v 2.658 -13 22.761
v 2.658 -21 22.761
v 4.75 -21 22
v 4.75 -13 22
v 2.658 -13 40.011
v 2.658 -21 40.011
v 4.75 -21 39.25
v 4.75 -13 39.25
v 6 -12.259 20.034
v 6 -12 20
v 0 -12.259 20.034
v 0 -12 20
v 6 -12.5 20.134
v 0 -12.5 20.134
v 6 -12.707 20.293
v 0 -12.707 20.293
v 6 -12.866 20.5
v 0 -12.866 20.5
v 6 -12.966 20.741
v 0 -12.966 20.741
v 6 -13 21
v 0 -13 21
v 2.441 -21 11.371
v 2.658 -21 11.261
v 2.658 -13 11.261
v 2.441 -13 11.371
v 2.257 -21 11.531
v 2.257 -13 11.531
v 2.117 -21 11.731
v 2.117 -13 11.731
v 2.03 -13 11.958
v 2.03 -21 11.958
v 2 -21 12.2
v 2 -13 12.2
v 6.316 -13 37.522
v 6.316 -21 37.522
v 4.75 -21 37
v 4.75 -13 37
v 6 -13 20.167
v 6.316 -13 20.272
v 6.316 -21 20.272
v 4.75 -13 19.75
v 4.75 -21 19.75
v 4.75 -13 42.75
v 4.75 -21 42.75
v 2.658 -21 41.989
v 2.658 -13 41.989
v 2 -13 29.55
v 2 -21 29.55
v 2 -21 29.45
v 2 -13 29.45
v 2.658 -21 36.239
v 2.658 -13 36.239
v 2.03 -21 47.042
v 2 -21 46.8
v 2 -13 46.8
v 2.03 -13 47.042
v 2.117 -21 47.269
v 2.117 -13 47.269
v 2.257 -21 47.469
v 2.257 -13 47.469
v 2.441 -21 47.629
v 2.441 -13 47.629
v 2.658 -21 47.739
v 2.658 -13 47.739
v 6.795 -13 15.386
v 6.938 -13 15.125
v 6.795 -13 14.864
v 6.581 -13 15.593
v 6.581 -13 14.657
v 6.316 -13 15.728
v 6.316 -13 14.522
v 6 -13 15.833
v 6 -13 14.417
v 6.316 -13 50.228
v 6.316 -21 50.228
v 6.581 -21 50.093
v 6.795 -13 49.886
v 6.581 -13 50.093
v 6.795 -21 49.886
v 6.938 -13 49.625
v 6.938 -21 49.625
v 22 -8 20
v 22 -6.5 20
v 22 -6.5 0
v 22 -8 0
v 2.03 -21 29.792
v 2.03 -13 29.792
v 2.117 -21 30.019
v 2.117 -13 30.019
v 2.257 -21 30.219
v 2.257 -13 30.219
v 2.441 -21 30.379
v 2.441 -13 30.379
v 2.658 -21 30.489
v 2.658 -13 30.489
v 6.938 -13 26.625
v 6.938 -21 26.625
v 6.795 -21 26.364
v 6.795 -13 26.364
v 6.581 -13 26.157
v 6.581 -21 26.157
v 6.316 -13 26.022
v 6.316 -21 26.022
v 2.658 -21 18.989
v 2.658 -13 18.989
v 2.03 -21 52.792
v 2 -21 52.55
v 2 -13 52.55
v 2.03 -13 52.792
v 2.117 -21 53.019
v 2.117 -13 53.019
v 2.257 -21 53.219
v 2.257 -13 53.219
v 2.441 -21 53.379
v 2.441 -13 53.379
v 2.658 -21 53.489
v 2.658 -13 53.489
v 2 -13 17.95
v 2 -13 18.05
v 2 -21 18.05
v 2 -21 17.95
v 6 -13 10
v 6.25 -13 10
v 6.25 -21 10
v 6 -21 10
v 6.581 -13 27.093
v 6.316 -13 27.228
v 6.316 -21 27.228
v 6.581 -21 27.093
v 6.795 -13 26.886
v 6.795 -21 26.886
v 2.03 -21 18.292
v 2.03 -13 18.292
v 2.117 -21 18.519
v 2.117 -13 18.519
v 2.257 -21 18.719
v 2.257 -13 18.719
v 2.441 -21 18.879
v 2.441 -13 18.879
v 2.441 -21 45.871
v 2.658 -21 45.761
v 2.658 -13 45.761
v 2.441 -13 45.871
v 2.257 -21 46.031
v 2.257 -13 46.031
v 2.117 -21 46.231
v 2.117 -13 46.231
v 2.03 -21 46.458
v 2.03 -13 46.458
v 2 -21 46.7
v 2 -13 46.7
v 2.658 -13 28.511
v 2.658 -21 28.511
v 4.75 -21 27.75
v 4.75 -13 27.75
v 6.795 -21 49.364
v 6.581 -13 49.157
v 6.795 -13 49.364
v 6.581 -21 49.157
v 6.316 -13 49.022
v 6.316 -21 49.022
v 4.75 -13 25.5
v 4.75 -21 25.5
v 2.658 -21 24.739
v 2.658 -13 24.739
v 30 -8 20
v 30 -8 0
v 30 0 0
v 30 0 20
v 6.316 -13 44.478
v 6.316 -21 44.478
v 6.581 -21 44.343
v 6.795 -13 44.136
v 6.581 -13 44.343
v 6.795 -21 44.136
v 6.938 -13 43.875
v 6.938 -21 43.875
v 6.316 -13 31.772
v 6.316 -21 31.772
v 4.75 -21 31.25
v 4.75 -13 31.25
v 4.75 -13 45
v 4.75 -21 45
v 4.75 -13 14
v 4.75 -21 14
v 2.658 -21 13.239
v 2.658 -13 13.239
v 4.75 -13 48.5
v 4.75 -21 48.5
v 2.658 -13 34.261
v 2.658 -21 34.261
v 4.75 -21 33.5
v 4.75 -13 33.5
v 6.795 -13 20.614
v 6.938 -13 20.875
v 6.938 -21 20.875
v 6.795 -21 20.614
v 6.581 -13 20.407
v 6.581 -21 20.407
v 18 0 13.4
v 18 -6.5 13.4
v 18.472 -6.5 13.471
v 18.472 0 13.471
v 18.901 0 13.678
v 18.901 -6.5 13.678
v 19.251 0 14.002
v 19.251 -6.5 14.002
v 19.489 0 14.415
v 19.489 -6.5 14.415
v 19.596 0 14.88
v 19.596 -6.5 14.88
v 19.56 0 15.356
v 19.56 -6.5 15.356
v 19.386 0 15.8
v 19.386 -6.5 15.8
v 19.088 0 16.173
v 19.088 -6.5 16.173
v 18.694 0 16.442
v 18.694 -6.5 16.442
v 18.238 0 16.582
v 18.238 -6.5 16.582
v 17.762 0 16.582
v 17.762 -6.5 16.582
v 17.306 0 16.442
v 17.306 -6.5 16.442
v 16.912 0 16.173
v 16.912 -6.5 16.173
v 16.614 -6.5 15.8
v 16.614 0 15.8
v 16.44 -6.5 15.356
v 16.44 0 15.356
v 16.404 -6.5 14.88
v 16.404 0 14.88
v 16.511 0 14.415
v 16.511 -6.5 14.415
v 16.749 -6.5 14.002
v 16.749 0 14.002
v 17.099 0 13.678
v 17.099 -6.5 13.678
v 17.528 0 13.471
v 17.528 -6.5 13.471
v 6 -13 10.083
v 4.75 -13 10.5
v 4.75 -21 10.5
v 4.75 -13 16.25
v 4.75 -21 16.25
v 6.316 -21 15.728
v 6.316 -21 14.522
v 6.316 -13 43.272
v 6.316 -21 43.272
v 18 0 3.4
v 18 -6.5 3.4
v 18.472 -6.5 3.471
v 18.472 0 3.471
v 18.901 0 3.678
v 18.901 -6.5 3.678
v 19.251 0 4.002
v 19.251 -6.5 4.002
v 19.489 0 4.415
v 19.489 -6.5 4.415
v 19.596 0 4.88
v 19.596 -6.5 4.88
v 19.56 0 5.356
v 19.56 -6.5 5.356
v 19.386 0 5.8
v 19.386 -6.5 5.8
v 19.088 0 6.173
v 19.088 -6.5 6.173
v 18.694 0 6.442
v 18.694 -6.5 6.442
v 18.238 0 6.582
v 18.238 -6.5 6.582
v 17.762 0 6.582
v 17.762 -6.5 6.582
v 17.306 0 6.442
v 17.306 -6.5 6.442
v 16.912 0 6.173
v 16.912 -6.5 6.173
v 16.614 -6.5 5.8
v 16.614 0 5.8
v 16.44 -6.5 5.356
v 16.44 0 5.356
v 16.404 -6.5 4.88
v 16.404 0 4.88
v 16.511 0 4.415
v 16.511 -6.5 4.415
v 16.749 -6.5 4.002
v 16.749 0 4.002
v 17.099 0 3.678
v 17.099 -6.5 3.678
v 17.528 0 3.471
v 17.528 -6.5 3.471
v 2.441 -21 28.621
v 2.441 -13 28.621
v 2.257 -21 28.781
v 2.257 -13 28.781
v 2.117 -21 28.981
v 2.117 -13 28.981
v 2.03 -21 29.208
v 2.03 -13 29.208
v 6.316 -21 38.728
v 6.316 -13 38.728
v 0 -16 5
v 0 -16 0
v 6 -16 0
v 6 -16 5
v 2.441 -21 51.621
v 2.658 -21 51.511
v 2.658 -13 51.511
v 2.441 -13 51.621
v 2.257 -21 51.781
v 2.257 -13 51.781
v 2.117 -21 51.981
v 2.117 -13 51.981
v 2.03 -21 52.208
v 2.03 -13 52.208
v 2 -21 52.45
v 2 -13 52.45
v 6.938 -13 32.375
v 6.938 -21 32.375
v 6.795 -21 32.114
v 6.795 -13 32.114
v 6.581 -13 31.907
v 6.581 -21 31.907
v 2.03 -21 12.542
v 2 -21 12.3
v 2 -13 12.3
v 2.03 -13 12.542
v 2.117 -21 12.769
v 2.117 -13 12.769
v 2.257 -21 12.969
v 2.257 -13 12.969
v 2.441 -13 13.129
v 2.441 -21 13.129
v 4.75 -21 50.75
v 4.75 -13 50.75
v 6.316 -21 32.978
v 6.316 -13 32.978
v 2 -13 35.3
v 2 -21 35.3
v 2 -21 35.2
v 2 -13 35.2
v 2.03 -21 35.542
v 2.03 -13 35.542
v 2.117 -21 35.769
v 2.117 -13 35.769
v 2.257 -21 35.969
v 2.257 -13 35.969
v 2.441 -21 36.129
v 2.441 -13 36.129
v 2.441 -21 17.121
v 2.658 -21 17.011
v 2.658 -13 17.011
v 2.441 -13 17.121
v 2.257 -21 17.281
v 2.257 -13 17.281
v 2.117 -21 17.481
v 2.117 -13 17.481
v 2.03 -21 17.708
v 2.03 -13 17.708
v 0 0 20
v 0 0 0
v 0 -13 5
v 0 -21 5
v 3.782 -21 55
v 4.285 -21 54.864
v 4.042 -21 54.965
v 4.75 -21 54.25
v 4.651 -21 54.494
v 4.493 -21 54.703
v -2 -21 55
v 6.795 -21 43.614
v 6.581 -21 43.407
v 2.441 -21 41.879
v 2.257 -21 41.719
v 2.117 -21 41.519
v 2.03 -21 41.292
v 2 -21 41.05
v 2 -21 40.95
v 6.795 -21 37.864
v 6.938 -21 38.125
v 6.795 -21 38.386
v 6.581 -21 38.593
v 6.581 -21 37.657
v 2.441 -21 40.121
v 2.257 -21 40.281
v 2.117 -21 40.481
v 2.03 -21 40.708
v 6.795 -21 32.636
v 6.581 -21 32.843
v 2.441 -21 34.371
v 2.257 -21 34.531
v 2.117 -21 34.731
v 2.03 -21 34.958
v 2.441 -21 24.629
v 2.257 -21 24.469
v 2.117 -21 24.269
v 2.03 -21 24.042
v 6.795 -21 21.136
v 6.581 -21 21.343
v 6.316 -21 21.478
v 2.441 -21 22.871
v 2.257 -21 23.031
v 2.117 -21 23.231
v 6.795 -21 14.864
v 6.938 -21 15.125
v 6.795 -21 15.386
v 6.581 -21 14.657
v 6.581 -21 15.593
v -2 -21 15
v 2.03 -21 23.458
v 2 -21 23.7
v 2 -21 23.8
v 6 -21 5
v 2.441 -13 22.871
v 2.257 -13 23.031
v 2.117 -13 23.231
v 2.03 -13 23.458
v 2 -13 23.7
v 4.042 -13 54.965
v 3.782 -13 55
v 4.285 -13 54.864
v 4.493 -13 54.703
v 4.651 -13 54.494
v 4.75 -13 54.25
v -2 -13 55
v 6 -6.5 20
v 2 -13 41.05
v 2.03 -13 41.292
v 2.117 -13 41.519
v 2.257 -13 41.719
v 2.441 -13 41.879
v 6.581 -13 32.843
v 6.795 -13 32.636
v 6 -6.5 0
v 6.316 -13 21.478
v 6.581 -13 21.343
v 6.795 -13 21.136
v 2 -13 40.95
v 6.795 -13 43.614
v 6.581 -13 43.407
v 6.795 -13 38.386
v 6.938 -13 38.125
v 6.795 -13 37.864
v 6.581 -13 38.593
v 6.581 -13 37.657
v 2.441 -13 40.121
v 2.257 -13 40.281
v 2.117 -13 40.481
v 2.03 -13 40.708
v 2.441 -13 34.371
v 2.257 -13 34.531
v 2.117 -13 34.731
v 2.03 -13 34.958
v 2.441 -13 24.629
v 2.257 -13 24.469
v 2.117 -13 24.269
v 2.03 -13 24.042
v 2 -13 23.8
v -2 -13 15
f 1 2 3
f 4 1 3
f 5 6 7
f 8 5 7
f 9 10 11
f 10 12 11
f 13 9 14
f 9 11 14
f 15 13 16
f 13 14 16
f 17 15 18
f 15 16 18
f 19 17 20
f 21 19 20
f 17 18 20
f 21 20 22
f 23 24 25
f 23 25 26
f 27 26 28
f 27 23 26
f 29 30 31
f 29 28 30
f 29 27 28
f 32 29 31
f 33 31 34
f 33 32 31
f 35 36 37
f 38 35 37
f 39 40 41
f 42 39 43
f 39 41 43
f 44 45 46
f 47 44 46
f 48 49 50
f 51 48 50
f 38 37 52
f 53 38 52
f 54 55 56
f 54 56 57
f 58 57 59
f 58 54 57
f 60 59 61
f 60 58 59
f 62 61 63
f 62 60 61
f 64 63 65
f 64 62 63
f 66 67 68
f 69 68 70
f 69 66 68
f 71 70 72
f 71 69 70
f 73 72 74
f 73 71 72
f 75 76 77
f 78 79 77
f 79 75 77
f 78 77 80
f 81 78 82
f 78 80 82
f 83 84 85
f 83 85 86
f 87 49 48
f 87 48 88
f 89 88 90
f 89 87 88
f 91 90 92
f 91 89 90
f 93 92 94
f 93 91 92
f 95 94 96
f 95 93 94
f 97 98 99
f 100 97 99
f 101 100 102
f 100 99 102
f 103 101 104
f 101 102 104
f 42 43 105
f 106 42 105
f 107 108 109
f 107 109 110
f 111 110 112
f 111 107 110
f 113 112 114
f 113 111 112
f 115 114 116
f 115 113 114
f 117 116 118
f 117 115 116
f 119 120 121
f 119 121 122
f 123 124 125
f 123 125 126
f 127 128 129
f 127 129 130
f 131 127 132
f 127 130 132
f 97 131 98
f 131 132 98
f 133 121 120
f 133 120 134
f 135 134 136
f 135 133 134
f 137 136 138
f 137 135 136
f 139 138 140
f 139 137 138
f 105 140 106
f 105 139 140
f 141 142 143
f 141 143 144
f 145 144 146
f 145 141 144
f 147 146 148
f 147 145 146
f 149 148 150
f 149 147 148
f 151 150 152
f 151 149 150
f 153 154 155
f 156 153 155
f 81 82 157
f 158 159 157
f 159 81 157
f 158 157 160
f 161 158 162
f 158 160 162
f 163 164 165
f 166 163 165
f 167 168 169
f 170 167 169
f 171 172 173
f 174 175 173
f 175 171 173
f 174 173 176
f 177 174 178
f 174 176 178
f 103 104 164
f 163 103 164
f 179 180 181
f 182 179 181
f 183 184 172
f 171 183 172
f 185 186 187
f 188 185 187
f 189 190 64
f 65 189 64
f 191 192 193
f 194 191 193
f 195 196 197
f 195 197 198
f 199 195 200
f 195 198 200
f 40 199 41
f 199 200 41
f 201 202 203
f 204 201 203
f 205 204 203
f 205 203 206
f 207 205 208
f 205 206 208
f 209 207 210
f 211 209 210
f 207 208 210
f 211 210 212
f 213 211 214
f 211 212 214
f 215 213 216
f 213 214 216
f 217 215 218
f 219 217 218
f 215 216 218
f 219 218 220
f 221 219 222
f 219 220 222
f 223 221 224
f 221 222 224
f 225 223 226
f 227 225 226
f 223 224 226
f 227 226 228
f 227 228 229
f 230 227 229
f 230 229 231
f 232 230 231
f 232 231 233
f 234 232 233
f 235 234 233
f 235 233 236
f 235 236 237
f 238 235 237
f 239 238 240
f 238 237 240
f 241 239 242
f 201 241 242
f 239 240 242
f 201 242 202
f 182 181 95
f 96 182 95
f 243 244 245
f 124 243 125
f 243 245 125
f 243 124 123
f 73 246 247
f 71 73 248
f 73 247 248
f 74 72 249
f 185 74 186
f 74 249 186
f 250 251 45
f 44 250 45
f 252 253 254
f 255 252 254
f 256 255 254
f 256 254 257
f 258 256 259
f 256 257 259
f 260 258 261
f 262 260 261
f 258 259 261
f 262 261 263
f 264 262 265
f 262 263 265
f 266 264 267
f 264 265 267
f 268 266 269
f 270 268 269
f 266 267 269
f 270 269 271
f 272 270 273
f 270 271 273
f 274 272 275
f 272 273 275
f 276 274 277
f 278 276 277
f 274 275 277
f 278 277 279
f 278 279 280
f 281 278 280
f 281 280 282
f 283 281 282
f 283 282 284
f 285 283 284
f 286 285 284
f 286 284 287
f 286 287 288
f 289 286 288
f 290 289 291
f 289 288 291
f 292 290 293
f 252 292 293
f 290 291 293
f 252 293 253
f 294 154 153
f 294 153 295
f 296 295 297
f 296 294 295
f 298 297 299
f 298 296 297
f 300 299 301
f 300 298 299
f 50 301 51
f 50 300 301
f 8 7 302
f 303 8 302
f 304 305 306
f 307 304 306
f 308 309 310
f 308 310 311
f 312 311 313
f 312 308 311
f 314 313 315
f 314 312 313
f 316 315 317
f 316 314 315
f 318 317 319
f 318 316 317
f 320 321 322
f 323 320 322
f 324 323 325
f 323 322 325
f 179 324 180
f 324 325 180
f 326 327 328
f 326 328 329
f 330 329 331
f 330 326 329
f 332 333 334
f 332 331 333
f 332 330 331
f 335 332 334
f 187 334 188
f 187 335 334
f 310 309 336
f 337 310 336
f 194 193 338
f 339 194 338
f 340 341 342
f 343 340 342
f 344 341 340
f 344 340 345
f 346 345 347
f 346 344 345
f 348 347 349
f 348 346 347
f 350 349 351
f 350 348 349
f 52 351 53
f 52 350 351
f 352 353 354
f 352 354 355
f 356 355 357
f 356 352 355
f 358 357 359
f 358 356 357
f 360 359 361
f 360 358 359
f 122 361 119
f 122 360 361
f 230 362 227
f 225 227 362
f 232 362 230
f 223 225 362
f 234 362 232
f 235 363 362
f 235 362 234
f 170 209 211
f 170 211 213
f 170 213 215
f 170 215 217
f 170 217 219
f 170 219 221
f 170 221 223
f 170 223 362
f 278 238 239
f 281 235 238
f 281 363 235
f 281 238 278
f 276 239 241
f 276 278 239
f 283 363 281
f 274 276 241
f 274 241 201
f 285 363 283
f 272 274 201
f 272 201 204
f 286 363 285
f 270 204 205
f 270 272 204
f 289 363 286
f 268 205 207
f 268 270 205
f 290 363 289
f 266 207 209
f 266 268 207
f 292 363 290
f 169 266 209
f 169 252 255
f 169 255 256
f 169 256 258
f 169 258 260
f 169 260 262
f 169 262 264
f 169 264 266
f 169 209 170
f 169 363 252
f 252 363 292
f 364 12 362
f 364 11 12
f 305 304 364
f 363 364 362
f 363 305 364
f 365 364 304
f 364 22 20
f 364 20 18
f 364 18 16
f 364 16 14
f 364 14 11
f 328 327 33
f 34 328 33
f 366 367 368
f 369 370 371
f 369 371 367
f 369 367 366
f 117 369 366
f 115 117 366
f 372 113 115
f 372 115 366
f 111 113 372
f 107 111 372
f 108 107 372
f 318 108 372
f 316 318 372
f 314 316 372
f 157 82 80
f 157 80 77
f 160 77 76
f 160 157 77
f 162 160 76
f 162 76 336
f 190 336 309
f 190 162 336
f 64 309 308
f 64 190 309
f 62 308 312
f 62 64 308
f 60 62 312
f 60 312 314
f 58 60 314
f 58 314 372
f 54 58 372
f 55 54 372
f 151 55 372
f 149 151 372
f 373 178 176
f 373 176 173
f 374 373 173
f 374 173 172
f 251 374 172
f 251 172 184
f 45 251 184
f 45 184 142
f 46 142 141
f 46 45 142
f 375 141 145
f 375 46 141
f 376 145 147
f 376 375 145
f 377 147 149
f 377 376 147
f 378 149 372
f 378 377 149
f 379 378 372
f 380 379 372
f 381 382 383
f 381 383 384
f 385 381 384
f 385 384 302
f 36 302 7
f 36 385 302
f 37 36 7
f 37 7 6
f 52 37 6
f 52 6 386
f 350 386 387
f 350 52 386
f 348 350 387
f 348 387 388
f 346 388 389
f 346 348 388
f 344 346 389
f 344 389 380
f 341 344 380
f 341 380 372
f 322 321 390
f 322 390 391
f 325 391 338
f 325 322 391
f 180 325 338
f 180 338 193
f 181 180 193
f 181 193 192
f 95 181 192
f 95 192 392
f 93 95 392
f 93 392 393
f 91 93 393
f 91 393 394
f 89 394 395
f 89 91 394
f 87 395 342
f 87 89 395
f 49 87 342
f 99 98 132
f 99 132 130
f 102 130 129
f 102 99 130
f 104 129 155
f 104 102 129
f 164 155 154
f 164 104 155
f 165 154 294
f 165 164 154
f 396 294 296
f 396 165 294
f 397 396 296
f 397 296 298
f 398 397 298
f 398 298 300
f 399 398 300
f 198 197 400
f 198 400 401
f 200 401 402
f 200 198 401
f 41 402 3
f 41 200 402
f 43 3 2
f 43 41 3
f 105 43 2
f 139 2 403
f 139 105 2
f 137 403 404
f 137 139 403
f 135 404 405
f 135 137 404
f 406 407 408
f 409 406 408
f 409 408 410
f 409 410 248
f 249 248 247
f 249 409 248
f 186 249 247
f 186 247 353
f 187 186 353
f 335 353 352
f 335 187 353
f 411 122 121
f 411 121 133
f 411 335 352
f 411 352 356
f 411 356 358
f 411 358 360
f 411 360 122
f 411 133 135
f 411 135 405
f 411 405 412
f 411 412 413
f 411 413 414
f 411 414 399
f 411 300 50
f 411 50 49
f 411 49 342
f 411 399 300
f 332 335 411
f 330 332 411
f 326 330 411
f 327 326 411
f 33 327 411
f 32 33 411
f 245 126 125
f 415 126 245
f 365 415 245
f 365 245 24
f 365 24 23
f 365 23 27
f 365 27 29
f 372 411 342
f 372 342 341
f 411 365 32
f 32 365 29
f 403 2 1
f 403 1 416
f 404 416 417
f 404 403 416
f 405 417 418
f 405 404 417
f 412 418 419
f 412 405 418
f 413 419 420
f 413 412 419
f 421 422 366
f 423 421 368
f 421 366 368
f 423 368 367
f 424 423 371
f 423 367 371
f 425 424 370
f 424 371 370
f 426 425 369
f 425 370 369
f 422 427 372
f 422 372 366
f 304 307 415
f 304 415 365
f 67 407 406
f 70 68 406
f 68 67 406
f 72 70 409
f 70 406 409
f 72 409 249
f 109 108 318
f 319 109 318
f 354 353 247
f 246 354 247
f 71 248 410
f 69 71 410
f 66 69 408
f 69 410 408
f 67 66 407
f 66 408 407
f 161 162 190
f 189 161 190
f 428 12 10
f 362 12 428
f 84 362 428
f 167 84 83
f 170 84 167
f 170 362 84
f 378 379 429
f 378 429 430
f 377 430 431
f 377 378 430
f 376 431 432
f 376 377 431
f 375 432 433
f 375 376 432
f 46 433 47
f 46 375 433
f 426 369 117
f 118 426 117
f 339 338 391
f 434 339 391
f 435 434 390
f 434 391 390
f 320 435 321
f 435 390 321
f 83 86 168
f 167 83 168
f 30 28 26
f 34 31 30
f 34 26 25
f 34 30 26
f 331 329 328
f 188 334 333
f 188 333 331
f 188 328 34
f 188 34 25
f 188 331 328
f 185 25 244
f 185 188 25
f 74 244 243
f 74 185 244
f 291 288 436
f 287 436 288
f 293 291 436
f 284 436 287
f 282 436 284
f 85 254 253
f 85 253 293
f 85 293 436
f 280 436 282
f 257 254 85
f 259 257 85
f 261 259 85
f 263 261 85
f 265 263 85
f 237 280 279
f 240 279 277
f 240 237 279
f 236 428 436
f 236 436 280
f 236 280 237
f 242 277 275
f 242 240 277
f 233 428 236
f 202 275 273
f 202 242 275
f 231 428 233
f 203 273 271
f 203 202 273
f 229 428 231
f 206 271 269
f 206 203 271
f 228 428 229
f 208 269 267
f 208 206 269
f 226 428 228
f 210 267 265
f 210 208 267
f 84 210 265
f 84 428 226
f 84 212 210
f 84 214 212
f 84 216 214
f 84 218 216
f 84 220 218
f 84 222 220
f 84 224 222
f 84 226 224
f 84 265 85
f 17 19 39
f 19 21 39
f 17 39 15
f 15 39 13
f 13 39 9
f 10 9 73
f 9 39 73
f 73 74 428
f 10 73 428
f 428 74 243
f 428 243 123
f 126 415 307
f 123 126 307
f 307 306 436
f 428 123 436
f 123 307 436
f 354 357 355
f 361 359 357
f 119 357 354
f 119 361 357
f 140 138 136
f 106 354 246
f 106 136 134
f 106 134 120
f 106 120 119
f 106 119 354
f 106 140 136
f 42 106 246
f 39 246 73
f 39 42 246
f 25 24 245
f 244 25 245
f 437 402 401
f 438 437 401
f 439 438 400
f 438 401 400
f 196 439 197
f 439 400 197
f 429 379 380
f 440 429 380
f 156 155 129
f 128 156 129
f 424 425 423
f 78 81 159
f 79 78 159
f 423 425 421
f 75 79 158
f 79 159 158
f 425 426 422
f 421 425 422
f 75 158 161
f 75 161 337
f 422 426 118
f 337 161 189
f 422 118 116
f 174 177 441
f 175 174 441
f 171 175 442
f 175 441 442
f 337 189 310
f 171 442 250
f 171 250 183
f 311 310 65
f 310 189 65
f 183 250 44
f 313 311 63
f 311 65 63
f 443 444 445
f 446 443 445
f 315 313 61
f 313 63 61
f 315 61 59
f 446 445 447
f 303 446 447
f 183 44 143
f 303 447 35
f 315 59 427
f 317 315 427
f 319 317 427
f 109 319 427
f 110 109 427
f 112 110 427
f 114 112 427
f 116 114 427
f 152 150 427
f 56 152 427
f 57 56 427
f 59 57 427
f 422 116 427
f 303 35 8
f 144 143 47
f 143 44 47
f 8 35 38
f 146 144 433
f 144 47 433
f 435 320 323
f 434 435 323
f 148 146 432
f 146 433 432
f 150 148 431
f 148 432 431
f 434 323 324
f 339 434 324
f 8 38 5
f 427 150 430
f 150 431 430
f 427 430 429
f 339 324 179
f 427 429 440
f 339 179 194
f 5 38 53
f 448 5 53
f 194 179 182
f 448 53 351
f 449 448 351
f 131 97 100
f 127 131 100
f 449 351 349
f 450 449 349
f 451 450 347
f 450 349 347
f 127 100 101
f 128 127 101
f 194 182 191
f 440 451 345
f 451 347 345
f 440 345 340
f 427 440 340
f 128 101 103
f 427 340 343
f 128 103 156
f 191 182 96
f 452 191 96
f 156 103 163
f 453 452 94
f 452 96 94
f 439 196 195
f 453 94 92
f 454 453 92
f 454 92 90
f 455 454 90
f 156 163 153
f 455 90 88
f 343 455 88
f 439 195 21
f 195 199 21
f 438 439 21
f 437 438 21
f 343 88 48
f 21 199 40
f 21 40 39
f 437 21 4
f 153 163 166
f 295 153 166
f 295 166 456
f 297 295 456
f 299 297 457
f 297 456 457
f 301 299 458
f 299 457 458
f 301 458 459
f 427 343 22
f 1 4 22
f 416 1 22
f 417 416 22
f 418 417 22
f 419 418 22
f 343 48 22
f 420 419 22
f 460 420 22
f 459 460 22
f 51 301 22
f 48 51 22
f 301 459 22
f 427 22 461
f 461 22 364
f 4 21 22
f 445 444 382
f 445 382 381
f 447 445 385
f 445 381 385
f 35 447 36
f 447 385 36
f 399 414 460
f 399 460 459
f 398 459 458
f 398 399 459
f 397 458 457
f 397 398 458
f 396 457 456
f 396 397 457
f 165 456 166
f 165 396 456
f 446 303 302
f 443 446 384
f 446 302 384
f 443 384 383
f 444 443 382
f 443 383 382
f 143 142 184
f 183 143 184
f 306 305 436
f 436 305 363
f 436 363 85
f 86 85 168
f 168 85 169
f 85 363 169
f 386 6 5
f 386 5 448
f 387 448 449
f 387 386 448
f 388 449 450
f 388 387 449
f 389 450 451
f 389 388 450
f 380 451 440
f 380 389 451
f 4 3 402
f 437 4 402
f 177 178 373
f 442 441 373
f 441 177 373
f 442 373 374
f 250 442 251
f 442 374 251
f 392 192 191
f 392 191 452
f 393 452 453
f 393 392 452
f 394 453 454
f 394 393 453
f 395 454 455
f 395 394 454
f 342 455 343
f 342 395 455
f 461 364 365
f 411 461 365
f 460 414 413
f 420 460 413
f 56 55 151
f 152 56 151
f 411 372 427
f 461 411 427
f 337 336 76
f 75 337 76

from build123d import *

# Parameters (mm, degrees)
SKETCH1_W           = 30
SKETCH1_H           = 16
BOSS_EXTRUDE1_DEPTH = 20
CUT_EXTRUDE1_DEPTH  = 20
SKETCH3_W           = 6
SKETCH3_H           = 10
BOSS_EXTRUDE2_DEPTH = 5
SKETCH9_R           = 1.6
CUT_EXTRUDE3_DEPTH  = 6.5
SKETCH11_W          = 10
SKETCH11_H          = 8
BOSS_EXTRUDE4_DEPTH = 40
CHAMFER2_SIZE2      = 10
CHAMFER2_SIZE       = 2
FILLET1_R           = 1
CUT_EXTRUDE4_DEPTH  = 8
SKETCH13_W          = 2
SKETCH13_H          = 8
BOSS_EXTRUDE5_DEPTH = 10
LPATTERN1_COUNT     = 8
LPATTERN1_PITCH     = 5.75
FILLET2_R           = 1
FILLET3_R           = 1
SKETCH14_W          = 2
SKETCH14_H          = 8
CUT_EXTRUDE5_DEPTH  = 5


# Some blends are built 0.0001 mm under size
with BuildPart() as part:
    # Sketch1 → Boss-Extrude1 (new body)
    with BuildSketch(Plane.XY):
        with Locations((15, -8)):
            Rectangle(SKETCH1_W, SKETCH1_H)
    extrude(amount=BOSS_EXTRUDE1_DEPTH)

    # Sketch2 → Cut-Extrude1 (cut)
    with BuildSketch(Plane.XY.offset(20)):
        Polygon((22, -6.5), (22, -8), (30, -8), (30, -16), (6, -16), (6, -6.5), align=None)
    extrude(amount=-CUT_EXTRUDE1_DEPTH, mode=Mode.SUBTRACT)

    # Sketch3 → Boss-Extrude2 (add)
    with BuildSketch(Plane.XZ.offset(16)):
        with Locations((3, 10)):
            Rectangle(SKETCH3_W, SKETCH3_H)
    extrude(amount=BOSS_EXTRUDE2_DEPTH)

    # Sketch9 → Cut-Extrude3 (cut)
    with BuildSketch(Plane.XZ.offset(6.5)):
        with Locations(Location((18, 15, 0), (0, 0, 270))):
            Circle(SKETCH9_R)
        with Locations(Location((18, 5, 0), (0, 0, 270))):
            Circle(SKETCH9_R)
    extrude(amount=-CUT_EXTRUDE3_DEPTH, mode=Mode.SUBTRACT)

    # Sketch11 → Boss-Extrude4 (add)
    with BuildSketch(Plane.XY.offset(15)):
        with Locations((3, -17)):
            Rectangle(SKETCH11_W, SKETCH11_H)
    extrude(amount=BOSS_EXTRUDE4_DEPTH)

    # Chamfer2
    chamfer2_edges = [part.edges().sort_by_distance(p)[0] for p in [
        (0, -17, 15),
    ]]
    chamfer2_side = [part.faces().sort_by_distance(p)[0] for p in [
        (-0.04, -17, 15),
    ]]
    chamfer(chamfer2_edges, length=CHAMFER2_SIZE - 0.0001, length2=CHAMFER2_SIZE2 - 0.0001, reference=chamfer2_side[0])  # a hair under: the kernel refuses the full size

    # Fillet1
    fillet1_edges = [part.edges().sort_by_distance(p)[0] for p in [
        (3, -13, 20),
    ]]
    fillet(fillet1_edges, radius=FILLET1_R)

    # Sketch12 → Cut-Extrude4 (cut)
    with BuildSketch(Plane.XZ.offset(21)):
        Polygon((7, 55), (4.75, 54.25), (2, 53.25), (2, 51.75), (4.75, 50.75), (7, 50), (7, 49.25), (8, 49.25), (8, 55), align=None)
    cut_extrude4 = extrude(amount=-CUT_EXTRUDE4_DEPTH, mode=Mode.SUBTRACT)

    # Sketch13 → Boss-Extrude5 (add)
    with BuildSketch(Plane(origin=(0, 0, 15), x_dir=(-1, 0, 0), z_dir=(0, 0, -1))):
        with Locations((-7, -17)):
            Rectangle(SKETCH13_W, SKETCH13_H)
    extrude(amount=BOSS_EXTRUDE5_DEPTH)

    # LPattern1: Cut-Extrude4 ×8
    with Locations(*[(0, 0, -i * LPATTERN1_PITCH) for i in range(1, LPATTERN1_COUNT)]):
        add(cut_extrude4, mode=Mode.SUBTRACT)

    # Fillet2
    # the kernel refuses this fillet: 1 mm, written as the material it adds along each edge
    with BuildSketch(Plane(origin=(2, -21, 51.75), x_dir=(0.9397934234884382, 0, -0.3417430630867014), z_dir=(0, 1, 0)), Plane(origin=(2, -21, 53.25), x_dir=(0, 0, -1), z_dir=(0, 1, 0)), Plane(origin=(2, -21, 46), x_dir=(0.9397934234884356, 0, -0.34174306308670804), z_dir=(0, 1, 0)), Plane(origin=(2, -21, 47.5), x_dir=(0, 0, -1), z_dir=(0, 1, 0)), Plane(origin=(2, -21, 40.25), x_dir=(0.9397934234884383, 0, -0.3417430630867007), z_dir=(0, 1, 0)), Plane(origin=(2, -21, 41.75), x_dir=(0, 0, -1), z_dir=(0, 1, 0)), Plane(origin=(2, -21, 28.75), x_dir=(0.939793423488437, 0, -0.3417430630867048), z_dir=(0, 1, 0)), Plane(origin=(2, -21, 30.25), x_dir=(0, 0, -1), z_dir=(0, 1, 0)), Plane(origin=(2, -21, 34.5), x_dir=(0.9397934234884383, 0, -0.3417430630867007), z_dir=(0, 1, 0)), Plane(origin=(2, -21, 36), x_dir=(0, 0, -1), z_dir=(0, 1, 0)), Plane(origin=(2, -21, 24.5), x_dir=(0, 0, -1), z_dir=(0, 1, 0)), Plane(origin=(2, -21, 23), x_dir=(0.939793423488437, 0, -0.3417430630867048), z_dir=(0, 1, 0))) as fillet2_piece_1:
        with BuildLine():
            CenterArc((FILLET2_R * 0.700427264611, -FILLET2_R), FILLET2_R, 90, 70.016893478)
            Line((-FILLET2_R * 0.239366158878, -FILLET2_R * 0.658256936913), (0, 0))
            Line((0, 0), (FILLET2_R * 0.700427264611, 0))
        make_face()
    extrude(amount=8)
    with BuildSketch(Plane(origin=(2, -21, 11.5), x_dir=(0.939793423488437, 0, -0.3417430630867044), z_dir=(0, 1, 0)), Plane(origin=(2, -21, 13), x_dir=(0, 0, -1), z_dir=(0, 1, 0)), Plane(origin=(2, -21, 17.25), x_dir=(0.939793423488437, 0, -0.3417430630867048), z_dir=(0, 1, 0))) as fillet2_piece_2:
        with BuildLine():
            CenterArc((FILLET2_R * 0.700427264611, -FILLET2_R), FILLET2_R, 90, 70.016893478)
            Line((-FILLET2_R * 0.239366158878, -FILLET2_R * 0.658256936913), (0, 0))
            Line((0, 0), (FILLET2_R * 0.700427264611, 0))
        make_face()
    extrude(amount=9.751068162)
    with BuildSketch(Plane(origin=(2, -21, 18.75), x_dir=(0.9397934234884369, 0, 0.34174306308670505), z_dir=(0, 1, 0))) as fillet2_piece_3:
        with BuildLine():
            CenterArc((FILLET2_R * 0.700427264611, FILLET2_R), FILLET2_R, 199.983106522, 70.016893478)
            Line((-FILLET2_R * 0.239366158878, FILLET2_R * 0.658256936913), (0, 0))
            Line((0, 0), (FILLET2_R * 0.700427264611, 0))
        make_face()
    extrude(amount=9.751068162)
    # the kernel refuses this fillet: 1 mm, written as the material it takes off along each edge
    with BuildSketch(Plane(origin=(7, -22.80189805, 26.25), x_dir=(-0.9486832980505139, 0, -0.31622776601683794), z_dir=(0, 1, 0)), Plane(origin=(7, -22.80189805, 27), x_dir=(0, 0, -1), z_dir=(0, 1, 0)), Plane(origin=(7, -22.80189805, 32), x_dir=(-0.9486832980505122, 0, -0.31622776601684277), z_dir=(0, 1, 0)), Plane(origin=(7, -22.80189805, 32.75), x_dir=(0, 0, -1), z_dir=(0, 1, 0)), Plane(origin=(7, -22.80189805, 37.75), x_dir=(-0.9486832980505133, 0, -0.31622776601683944), z_dir=(0, 1, 0)), Plane(origin=(7, -22.80189805, 38.5), x_dir=(0, 0, -1), z_dir=(0, 1, 0)), Plane(origin=(7, -22.80189805, 43.5), x_dir=(-0.9486832980505137, 0, -0.31622776601683833), z_dir=(0, 1, 0)), Plane(origin=(7, -22.80189805, 44.25), x_dir=(0, 0, -1), z_dir=(0, 1, 0)), Plane(origin=(7, -22.80189805, 49.25), x_dir=(-0.9486832980505137, 0, -0.31622776601683833), z_dir=(0, 1, 0)), Plane(origin=(7, -22.80189805, 50), x_dir=(0, 0, -1), z_dir=(0, 1, 0)), Plane(origin=(7, -22.80189805, 14.75), x_dir=(-0.9486832980505139, 0, -0.31622776601683794), z_dir=(0, 1, 0)), Plane(origin=(7, -22.80189805, 15.5), x_dir=(0, 0, -1), z_dir=(0, 1, 0)), Plane(origin=(7, -22.80189805, 20.5), x_dir=(-0.9486832980505137, 0, -0.3162277660168387), z_dir=(0, 1, 0)), Plane(origin=(7, -22.80189805, 21.25), x_dir=(0, 0, -1), z_dir=(0, 1, 0))) as fillet2_2_piece_1:
        with BuildLine():
            CenterArc((FILLET2_R * 0.720759220056, FILLET2_R), FILLET2_R, 198.434948823, 71.565051177)
            Line((-FILLET2_R * 0.227924077994, FILLET2_R * 0.683772233983), (0, 0))
            Line((0, 0), (FILLET2_R * 0.720759220056, 0))
        make_face()
    extrude(amount=11.6037961, mode=Mode.SUBTRACT)

    # Fillet3
    # the kernel refuses this fillet: 1 mm, written as the material it takes off along each edge
    with BuildSketch(Plane(origin=(7, -29.045614591, 55), x_dir=(-1, 0, 0), z_dir=(0, 1, 0))) as fillet3_piece_1:
        with BuildLine():
            CenterArc((3.218245837, -1), FILLET3_R, 90, 75.522487814)
            Line((2.25, -0.75), (2.230635083, -0.745))
            ThreePointArc((2.230635083, -0.745), (1.118675445, -0.393973666), (-0.006324555, -0.018973666))
            Line((-0.006324555, -0.018973666), (0, 0.02))
            Line((0, 0.02), (3.218245837, 0.02))
            Line((3.218245837, 0.02), (3.218245837, 0))
        make_face()
    extrude(amount=24.091229183, mode=Mode.SUBTRACT)

    # Sketch14 → Cut-Extrude5 (cut)
    with BuildSketch(Plane(origin=(0, 0, 5), x_dir=(-1, 0, 0), z_dir=(0, 0, -1))):
        with Locations((-7, -17)):
            Rectangle(SKETCH14_W, SKETCH14_H)
    extrude(amount=-CUT_EXTRUDE5_DEPTH, mode=Mode.SUBTRACT)


solid = part.part
